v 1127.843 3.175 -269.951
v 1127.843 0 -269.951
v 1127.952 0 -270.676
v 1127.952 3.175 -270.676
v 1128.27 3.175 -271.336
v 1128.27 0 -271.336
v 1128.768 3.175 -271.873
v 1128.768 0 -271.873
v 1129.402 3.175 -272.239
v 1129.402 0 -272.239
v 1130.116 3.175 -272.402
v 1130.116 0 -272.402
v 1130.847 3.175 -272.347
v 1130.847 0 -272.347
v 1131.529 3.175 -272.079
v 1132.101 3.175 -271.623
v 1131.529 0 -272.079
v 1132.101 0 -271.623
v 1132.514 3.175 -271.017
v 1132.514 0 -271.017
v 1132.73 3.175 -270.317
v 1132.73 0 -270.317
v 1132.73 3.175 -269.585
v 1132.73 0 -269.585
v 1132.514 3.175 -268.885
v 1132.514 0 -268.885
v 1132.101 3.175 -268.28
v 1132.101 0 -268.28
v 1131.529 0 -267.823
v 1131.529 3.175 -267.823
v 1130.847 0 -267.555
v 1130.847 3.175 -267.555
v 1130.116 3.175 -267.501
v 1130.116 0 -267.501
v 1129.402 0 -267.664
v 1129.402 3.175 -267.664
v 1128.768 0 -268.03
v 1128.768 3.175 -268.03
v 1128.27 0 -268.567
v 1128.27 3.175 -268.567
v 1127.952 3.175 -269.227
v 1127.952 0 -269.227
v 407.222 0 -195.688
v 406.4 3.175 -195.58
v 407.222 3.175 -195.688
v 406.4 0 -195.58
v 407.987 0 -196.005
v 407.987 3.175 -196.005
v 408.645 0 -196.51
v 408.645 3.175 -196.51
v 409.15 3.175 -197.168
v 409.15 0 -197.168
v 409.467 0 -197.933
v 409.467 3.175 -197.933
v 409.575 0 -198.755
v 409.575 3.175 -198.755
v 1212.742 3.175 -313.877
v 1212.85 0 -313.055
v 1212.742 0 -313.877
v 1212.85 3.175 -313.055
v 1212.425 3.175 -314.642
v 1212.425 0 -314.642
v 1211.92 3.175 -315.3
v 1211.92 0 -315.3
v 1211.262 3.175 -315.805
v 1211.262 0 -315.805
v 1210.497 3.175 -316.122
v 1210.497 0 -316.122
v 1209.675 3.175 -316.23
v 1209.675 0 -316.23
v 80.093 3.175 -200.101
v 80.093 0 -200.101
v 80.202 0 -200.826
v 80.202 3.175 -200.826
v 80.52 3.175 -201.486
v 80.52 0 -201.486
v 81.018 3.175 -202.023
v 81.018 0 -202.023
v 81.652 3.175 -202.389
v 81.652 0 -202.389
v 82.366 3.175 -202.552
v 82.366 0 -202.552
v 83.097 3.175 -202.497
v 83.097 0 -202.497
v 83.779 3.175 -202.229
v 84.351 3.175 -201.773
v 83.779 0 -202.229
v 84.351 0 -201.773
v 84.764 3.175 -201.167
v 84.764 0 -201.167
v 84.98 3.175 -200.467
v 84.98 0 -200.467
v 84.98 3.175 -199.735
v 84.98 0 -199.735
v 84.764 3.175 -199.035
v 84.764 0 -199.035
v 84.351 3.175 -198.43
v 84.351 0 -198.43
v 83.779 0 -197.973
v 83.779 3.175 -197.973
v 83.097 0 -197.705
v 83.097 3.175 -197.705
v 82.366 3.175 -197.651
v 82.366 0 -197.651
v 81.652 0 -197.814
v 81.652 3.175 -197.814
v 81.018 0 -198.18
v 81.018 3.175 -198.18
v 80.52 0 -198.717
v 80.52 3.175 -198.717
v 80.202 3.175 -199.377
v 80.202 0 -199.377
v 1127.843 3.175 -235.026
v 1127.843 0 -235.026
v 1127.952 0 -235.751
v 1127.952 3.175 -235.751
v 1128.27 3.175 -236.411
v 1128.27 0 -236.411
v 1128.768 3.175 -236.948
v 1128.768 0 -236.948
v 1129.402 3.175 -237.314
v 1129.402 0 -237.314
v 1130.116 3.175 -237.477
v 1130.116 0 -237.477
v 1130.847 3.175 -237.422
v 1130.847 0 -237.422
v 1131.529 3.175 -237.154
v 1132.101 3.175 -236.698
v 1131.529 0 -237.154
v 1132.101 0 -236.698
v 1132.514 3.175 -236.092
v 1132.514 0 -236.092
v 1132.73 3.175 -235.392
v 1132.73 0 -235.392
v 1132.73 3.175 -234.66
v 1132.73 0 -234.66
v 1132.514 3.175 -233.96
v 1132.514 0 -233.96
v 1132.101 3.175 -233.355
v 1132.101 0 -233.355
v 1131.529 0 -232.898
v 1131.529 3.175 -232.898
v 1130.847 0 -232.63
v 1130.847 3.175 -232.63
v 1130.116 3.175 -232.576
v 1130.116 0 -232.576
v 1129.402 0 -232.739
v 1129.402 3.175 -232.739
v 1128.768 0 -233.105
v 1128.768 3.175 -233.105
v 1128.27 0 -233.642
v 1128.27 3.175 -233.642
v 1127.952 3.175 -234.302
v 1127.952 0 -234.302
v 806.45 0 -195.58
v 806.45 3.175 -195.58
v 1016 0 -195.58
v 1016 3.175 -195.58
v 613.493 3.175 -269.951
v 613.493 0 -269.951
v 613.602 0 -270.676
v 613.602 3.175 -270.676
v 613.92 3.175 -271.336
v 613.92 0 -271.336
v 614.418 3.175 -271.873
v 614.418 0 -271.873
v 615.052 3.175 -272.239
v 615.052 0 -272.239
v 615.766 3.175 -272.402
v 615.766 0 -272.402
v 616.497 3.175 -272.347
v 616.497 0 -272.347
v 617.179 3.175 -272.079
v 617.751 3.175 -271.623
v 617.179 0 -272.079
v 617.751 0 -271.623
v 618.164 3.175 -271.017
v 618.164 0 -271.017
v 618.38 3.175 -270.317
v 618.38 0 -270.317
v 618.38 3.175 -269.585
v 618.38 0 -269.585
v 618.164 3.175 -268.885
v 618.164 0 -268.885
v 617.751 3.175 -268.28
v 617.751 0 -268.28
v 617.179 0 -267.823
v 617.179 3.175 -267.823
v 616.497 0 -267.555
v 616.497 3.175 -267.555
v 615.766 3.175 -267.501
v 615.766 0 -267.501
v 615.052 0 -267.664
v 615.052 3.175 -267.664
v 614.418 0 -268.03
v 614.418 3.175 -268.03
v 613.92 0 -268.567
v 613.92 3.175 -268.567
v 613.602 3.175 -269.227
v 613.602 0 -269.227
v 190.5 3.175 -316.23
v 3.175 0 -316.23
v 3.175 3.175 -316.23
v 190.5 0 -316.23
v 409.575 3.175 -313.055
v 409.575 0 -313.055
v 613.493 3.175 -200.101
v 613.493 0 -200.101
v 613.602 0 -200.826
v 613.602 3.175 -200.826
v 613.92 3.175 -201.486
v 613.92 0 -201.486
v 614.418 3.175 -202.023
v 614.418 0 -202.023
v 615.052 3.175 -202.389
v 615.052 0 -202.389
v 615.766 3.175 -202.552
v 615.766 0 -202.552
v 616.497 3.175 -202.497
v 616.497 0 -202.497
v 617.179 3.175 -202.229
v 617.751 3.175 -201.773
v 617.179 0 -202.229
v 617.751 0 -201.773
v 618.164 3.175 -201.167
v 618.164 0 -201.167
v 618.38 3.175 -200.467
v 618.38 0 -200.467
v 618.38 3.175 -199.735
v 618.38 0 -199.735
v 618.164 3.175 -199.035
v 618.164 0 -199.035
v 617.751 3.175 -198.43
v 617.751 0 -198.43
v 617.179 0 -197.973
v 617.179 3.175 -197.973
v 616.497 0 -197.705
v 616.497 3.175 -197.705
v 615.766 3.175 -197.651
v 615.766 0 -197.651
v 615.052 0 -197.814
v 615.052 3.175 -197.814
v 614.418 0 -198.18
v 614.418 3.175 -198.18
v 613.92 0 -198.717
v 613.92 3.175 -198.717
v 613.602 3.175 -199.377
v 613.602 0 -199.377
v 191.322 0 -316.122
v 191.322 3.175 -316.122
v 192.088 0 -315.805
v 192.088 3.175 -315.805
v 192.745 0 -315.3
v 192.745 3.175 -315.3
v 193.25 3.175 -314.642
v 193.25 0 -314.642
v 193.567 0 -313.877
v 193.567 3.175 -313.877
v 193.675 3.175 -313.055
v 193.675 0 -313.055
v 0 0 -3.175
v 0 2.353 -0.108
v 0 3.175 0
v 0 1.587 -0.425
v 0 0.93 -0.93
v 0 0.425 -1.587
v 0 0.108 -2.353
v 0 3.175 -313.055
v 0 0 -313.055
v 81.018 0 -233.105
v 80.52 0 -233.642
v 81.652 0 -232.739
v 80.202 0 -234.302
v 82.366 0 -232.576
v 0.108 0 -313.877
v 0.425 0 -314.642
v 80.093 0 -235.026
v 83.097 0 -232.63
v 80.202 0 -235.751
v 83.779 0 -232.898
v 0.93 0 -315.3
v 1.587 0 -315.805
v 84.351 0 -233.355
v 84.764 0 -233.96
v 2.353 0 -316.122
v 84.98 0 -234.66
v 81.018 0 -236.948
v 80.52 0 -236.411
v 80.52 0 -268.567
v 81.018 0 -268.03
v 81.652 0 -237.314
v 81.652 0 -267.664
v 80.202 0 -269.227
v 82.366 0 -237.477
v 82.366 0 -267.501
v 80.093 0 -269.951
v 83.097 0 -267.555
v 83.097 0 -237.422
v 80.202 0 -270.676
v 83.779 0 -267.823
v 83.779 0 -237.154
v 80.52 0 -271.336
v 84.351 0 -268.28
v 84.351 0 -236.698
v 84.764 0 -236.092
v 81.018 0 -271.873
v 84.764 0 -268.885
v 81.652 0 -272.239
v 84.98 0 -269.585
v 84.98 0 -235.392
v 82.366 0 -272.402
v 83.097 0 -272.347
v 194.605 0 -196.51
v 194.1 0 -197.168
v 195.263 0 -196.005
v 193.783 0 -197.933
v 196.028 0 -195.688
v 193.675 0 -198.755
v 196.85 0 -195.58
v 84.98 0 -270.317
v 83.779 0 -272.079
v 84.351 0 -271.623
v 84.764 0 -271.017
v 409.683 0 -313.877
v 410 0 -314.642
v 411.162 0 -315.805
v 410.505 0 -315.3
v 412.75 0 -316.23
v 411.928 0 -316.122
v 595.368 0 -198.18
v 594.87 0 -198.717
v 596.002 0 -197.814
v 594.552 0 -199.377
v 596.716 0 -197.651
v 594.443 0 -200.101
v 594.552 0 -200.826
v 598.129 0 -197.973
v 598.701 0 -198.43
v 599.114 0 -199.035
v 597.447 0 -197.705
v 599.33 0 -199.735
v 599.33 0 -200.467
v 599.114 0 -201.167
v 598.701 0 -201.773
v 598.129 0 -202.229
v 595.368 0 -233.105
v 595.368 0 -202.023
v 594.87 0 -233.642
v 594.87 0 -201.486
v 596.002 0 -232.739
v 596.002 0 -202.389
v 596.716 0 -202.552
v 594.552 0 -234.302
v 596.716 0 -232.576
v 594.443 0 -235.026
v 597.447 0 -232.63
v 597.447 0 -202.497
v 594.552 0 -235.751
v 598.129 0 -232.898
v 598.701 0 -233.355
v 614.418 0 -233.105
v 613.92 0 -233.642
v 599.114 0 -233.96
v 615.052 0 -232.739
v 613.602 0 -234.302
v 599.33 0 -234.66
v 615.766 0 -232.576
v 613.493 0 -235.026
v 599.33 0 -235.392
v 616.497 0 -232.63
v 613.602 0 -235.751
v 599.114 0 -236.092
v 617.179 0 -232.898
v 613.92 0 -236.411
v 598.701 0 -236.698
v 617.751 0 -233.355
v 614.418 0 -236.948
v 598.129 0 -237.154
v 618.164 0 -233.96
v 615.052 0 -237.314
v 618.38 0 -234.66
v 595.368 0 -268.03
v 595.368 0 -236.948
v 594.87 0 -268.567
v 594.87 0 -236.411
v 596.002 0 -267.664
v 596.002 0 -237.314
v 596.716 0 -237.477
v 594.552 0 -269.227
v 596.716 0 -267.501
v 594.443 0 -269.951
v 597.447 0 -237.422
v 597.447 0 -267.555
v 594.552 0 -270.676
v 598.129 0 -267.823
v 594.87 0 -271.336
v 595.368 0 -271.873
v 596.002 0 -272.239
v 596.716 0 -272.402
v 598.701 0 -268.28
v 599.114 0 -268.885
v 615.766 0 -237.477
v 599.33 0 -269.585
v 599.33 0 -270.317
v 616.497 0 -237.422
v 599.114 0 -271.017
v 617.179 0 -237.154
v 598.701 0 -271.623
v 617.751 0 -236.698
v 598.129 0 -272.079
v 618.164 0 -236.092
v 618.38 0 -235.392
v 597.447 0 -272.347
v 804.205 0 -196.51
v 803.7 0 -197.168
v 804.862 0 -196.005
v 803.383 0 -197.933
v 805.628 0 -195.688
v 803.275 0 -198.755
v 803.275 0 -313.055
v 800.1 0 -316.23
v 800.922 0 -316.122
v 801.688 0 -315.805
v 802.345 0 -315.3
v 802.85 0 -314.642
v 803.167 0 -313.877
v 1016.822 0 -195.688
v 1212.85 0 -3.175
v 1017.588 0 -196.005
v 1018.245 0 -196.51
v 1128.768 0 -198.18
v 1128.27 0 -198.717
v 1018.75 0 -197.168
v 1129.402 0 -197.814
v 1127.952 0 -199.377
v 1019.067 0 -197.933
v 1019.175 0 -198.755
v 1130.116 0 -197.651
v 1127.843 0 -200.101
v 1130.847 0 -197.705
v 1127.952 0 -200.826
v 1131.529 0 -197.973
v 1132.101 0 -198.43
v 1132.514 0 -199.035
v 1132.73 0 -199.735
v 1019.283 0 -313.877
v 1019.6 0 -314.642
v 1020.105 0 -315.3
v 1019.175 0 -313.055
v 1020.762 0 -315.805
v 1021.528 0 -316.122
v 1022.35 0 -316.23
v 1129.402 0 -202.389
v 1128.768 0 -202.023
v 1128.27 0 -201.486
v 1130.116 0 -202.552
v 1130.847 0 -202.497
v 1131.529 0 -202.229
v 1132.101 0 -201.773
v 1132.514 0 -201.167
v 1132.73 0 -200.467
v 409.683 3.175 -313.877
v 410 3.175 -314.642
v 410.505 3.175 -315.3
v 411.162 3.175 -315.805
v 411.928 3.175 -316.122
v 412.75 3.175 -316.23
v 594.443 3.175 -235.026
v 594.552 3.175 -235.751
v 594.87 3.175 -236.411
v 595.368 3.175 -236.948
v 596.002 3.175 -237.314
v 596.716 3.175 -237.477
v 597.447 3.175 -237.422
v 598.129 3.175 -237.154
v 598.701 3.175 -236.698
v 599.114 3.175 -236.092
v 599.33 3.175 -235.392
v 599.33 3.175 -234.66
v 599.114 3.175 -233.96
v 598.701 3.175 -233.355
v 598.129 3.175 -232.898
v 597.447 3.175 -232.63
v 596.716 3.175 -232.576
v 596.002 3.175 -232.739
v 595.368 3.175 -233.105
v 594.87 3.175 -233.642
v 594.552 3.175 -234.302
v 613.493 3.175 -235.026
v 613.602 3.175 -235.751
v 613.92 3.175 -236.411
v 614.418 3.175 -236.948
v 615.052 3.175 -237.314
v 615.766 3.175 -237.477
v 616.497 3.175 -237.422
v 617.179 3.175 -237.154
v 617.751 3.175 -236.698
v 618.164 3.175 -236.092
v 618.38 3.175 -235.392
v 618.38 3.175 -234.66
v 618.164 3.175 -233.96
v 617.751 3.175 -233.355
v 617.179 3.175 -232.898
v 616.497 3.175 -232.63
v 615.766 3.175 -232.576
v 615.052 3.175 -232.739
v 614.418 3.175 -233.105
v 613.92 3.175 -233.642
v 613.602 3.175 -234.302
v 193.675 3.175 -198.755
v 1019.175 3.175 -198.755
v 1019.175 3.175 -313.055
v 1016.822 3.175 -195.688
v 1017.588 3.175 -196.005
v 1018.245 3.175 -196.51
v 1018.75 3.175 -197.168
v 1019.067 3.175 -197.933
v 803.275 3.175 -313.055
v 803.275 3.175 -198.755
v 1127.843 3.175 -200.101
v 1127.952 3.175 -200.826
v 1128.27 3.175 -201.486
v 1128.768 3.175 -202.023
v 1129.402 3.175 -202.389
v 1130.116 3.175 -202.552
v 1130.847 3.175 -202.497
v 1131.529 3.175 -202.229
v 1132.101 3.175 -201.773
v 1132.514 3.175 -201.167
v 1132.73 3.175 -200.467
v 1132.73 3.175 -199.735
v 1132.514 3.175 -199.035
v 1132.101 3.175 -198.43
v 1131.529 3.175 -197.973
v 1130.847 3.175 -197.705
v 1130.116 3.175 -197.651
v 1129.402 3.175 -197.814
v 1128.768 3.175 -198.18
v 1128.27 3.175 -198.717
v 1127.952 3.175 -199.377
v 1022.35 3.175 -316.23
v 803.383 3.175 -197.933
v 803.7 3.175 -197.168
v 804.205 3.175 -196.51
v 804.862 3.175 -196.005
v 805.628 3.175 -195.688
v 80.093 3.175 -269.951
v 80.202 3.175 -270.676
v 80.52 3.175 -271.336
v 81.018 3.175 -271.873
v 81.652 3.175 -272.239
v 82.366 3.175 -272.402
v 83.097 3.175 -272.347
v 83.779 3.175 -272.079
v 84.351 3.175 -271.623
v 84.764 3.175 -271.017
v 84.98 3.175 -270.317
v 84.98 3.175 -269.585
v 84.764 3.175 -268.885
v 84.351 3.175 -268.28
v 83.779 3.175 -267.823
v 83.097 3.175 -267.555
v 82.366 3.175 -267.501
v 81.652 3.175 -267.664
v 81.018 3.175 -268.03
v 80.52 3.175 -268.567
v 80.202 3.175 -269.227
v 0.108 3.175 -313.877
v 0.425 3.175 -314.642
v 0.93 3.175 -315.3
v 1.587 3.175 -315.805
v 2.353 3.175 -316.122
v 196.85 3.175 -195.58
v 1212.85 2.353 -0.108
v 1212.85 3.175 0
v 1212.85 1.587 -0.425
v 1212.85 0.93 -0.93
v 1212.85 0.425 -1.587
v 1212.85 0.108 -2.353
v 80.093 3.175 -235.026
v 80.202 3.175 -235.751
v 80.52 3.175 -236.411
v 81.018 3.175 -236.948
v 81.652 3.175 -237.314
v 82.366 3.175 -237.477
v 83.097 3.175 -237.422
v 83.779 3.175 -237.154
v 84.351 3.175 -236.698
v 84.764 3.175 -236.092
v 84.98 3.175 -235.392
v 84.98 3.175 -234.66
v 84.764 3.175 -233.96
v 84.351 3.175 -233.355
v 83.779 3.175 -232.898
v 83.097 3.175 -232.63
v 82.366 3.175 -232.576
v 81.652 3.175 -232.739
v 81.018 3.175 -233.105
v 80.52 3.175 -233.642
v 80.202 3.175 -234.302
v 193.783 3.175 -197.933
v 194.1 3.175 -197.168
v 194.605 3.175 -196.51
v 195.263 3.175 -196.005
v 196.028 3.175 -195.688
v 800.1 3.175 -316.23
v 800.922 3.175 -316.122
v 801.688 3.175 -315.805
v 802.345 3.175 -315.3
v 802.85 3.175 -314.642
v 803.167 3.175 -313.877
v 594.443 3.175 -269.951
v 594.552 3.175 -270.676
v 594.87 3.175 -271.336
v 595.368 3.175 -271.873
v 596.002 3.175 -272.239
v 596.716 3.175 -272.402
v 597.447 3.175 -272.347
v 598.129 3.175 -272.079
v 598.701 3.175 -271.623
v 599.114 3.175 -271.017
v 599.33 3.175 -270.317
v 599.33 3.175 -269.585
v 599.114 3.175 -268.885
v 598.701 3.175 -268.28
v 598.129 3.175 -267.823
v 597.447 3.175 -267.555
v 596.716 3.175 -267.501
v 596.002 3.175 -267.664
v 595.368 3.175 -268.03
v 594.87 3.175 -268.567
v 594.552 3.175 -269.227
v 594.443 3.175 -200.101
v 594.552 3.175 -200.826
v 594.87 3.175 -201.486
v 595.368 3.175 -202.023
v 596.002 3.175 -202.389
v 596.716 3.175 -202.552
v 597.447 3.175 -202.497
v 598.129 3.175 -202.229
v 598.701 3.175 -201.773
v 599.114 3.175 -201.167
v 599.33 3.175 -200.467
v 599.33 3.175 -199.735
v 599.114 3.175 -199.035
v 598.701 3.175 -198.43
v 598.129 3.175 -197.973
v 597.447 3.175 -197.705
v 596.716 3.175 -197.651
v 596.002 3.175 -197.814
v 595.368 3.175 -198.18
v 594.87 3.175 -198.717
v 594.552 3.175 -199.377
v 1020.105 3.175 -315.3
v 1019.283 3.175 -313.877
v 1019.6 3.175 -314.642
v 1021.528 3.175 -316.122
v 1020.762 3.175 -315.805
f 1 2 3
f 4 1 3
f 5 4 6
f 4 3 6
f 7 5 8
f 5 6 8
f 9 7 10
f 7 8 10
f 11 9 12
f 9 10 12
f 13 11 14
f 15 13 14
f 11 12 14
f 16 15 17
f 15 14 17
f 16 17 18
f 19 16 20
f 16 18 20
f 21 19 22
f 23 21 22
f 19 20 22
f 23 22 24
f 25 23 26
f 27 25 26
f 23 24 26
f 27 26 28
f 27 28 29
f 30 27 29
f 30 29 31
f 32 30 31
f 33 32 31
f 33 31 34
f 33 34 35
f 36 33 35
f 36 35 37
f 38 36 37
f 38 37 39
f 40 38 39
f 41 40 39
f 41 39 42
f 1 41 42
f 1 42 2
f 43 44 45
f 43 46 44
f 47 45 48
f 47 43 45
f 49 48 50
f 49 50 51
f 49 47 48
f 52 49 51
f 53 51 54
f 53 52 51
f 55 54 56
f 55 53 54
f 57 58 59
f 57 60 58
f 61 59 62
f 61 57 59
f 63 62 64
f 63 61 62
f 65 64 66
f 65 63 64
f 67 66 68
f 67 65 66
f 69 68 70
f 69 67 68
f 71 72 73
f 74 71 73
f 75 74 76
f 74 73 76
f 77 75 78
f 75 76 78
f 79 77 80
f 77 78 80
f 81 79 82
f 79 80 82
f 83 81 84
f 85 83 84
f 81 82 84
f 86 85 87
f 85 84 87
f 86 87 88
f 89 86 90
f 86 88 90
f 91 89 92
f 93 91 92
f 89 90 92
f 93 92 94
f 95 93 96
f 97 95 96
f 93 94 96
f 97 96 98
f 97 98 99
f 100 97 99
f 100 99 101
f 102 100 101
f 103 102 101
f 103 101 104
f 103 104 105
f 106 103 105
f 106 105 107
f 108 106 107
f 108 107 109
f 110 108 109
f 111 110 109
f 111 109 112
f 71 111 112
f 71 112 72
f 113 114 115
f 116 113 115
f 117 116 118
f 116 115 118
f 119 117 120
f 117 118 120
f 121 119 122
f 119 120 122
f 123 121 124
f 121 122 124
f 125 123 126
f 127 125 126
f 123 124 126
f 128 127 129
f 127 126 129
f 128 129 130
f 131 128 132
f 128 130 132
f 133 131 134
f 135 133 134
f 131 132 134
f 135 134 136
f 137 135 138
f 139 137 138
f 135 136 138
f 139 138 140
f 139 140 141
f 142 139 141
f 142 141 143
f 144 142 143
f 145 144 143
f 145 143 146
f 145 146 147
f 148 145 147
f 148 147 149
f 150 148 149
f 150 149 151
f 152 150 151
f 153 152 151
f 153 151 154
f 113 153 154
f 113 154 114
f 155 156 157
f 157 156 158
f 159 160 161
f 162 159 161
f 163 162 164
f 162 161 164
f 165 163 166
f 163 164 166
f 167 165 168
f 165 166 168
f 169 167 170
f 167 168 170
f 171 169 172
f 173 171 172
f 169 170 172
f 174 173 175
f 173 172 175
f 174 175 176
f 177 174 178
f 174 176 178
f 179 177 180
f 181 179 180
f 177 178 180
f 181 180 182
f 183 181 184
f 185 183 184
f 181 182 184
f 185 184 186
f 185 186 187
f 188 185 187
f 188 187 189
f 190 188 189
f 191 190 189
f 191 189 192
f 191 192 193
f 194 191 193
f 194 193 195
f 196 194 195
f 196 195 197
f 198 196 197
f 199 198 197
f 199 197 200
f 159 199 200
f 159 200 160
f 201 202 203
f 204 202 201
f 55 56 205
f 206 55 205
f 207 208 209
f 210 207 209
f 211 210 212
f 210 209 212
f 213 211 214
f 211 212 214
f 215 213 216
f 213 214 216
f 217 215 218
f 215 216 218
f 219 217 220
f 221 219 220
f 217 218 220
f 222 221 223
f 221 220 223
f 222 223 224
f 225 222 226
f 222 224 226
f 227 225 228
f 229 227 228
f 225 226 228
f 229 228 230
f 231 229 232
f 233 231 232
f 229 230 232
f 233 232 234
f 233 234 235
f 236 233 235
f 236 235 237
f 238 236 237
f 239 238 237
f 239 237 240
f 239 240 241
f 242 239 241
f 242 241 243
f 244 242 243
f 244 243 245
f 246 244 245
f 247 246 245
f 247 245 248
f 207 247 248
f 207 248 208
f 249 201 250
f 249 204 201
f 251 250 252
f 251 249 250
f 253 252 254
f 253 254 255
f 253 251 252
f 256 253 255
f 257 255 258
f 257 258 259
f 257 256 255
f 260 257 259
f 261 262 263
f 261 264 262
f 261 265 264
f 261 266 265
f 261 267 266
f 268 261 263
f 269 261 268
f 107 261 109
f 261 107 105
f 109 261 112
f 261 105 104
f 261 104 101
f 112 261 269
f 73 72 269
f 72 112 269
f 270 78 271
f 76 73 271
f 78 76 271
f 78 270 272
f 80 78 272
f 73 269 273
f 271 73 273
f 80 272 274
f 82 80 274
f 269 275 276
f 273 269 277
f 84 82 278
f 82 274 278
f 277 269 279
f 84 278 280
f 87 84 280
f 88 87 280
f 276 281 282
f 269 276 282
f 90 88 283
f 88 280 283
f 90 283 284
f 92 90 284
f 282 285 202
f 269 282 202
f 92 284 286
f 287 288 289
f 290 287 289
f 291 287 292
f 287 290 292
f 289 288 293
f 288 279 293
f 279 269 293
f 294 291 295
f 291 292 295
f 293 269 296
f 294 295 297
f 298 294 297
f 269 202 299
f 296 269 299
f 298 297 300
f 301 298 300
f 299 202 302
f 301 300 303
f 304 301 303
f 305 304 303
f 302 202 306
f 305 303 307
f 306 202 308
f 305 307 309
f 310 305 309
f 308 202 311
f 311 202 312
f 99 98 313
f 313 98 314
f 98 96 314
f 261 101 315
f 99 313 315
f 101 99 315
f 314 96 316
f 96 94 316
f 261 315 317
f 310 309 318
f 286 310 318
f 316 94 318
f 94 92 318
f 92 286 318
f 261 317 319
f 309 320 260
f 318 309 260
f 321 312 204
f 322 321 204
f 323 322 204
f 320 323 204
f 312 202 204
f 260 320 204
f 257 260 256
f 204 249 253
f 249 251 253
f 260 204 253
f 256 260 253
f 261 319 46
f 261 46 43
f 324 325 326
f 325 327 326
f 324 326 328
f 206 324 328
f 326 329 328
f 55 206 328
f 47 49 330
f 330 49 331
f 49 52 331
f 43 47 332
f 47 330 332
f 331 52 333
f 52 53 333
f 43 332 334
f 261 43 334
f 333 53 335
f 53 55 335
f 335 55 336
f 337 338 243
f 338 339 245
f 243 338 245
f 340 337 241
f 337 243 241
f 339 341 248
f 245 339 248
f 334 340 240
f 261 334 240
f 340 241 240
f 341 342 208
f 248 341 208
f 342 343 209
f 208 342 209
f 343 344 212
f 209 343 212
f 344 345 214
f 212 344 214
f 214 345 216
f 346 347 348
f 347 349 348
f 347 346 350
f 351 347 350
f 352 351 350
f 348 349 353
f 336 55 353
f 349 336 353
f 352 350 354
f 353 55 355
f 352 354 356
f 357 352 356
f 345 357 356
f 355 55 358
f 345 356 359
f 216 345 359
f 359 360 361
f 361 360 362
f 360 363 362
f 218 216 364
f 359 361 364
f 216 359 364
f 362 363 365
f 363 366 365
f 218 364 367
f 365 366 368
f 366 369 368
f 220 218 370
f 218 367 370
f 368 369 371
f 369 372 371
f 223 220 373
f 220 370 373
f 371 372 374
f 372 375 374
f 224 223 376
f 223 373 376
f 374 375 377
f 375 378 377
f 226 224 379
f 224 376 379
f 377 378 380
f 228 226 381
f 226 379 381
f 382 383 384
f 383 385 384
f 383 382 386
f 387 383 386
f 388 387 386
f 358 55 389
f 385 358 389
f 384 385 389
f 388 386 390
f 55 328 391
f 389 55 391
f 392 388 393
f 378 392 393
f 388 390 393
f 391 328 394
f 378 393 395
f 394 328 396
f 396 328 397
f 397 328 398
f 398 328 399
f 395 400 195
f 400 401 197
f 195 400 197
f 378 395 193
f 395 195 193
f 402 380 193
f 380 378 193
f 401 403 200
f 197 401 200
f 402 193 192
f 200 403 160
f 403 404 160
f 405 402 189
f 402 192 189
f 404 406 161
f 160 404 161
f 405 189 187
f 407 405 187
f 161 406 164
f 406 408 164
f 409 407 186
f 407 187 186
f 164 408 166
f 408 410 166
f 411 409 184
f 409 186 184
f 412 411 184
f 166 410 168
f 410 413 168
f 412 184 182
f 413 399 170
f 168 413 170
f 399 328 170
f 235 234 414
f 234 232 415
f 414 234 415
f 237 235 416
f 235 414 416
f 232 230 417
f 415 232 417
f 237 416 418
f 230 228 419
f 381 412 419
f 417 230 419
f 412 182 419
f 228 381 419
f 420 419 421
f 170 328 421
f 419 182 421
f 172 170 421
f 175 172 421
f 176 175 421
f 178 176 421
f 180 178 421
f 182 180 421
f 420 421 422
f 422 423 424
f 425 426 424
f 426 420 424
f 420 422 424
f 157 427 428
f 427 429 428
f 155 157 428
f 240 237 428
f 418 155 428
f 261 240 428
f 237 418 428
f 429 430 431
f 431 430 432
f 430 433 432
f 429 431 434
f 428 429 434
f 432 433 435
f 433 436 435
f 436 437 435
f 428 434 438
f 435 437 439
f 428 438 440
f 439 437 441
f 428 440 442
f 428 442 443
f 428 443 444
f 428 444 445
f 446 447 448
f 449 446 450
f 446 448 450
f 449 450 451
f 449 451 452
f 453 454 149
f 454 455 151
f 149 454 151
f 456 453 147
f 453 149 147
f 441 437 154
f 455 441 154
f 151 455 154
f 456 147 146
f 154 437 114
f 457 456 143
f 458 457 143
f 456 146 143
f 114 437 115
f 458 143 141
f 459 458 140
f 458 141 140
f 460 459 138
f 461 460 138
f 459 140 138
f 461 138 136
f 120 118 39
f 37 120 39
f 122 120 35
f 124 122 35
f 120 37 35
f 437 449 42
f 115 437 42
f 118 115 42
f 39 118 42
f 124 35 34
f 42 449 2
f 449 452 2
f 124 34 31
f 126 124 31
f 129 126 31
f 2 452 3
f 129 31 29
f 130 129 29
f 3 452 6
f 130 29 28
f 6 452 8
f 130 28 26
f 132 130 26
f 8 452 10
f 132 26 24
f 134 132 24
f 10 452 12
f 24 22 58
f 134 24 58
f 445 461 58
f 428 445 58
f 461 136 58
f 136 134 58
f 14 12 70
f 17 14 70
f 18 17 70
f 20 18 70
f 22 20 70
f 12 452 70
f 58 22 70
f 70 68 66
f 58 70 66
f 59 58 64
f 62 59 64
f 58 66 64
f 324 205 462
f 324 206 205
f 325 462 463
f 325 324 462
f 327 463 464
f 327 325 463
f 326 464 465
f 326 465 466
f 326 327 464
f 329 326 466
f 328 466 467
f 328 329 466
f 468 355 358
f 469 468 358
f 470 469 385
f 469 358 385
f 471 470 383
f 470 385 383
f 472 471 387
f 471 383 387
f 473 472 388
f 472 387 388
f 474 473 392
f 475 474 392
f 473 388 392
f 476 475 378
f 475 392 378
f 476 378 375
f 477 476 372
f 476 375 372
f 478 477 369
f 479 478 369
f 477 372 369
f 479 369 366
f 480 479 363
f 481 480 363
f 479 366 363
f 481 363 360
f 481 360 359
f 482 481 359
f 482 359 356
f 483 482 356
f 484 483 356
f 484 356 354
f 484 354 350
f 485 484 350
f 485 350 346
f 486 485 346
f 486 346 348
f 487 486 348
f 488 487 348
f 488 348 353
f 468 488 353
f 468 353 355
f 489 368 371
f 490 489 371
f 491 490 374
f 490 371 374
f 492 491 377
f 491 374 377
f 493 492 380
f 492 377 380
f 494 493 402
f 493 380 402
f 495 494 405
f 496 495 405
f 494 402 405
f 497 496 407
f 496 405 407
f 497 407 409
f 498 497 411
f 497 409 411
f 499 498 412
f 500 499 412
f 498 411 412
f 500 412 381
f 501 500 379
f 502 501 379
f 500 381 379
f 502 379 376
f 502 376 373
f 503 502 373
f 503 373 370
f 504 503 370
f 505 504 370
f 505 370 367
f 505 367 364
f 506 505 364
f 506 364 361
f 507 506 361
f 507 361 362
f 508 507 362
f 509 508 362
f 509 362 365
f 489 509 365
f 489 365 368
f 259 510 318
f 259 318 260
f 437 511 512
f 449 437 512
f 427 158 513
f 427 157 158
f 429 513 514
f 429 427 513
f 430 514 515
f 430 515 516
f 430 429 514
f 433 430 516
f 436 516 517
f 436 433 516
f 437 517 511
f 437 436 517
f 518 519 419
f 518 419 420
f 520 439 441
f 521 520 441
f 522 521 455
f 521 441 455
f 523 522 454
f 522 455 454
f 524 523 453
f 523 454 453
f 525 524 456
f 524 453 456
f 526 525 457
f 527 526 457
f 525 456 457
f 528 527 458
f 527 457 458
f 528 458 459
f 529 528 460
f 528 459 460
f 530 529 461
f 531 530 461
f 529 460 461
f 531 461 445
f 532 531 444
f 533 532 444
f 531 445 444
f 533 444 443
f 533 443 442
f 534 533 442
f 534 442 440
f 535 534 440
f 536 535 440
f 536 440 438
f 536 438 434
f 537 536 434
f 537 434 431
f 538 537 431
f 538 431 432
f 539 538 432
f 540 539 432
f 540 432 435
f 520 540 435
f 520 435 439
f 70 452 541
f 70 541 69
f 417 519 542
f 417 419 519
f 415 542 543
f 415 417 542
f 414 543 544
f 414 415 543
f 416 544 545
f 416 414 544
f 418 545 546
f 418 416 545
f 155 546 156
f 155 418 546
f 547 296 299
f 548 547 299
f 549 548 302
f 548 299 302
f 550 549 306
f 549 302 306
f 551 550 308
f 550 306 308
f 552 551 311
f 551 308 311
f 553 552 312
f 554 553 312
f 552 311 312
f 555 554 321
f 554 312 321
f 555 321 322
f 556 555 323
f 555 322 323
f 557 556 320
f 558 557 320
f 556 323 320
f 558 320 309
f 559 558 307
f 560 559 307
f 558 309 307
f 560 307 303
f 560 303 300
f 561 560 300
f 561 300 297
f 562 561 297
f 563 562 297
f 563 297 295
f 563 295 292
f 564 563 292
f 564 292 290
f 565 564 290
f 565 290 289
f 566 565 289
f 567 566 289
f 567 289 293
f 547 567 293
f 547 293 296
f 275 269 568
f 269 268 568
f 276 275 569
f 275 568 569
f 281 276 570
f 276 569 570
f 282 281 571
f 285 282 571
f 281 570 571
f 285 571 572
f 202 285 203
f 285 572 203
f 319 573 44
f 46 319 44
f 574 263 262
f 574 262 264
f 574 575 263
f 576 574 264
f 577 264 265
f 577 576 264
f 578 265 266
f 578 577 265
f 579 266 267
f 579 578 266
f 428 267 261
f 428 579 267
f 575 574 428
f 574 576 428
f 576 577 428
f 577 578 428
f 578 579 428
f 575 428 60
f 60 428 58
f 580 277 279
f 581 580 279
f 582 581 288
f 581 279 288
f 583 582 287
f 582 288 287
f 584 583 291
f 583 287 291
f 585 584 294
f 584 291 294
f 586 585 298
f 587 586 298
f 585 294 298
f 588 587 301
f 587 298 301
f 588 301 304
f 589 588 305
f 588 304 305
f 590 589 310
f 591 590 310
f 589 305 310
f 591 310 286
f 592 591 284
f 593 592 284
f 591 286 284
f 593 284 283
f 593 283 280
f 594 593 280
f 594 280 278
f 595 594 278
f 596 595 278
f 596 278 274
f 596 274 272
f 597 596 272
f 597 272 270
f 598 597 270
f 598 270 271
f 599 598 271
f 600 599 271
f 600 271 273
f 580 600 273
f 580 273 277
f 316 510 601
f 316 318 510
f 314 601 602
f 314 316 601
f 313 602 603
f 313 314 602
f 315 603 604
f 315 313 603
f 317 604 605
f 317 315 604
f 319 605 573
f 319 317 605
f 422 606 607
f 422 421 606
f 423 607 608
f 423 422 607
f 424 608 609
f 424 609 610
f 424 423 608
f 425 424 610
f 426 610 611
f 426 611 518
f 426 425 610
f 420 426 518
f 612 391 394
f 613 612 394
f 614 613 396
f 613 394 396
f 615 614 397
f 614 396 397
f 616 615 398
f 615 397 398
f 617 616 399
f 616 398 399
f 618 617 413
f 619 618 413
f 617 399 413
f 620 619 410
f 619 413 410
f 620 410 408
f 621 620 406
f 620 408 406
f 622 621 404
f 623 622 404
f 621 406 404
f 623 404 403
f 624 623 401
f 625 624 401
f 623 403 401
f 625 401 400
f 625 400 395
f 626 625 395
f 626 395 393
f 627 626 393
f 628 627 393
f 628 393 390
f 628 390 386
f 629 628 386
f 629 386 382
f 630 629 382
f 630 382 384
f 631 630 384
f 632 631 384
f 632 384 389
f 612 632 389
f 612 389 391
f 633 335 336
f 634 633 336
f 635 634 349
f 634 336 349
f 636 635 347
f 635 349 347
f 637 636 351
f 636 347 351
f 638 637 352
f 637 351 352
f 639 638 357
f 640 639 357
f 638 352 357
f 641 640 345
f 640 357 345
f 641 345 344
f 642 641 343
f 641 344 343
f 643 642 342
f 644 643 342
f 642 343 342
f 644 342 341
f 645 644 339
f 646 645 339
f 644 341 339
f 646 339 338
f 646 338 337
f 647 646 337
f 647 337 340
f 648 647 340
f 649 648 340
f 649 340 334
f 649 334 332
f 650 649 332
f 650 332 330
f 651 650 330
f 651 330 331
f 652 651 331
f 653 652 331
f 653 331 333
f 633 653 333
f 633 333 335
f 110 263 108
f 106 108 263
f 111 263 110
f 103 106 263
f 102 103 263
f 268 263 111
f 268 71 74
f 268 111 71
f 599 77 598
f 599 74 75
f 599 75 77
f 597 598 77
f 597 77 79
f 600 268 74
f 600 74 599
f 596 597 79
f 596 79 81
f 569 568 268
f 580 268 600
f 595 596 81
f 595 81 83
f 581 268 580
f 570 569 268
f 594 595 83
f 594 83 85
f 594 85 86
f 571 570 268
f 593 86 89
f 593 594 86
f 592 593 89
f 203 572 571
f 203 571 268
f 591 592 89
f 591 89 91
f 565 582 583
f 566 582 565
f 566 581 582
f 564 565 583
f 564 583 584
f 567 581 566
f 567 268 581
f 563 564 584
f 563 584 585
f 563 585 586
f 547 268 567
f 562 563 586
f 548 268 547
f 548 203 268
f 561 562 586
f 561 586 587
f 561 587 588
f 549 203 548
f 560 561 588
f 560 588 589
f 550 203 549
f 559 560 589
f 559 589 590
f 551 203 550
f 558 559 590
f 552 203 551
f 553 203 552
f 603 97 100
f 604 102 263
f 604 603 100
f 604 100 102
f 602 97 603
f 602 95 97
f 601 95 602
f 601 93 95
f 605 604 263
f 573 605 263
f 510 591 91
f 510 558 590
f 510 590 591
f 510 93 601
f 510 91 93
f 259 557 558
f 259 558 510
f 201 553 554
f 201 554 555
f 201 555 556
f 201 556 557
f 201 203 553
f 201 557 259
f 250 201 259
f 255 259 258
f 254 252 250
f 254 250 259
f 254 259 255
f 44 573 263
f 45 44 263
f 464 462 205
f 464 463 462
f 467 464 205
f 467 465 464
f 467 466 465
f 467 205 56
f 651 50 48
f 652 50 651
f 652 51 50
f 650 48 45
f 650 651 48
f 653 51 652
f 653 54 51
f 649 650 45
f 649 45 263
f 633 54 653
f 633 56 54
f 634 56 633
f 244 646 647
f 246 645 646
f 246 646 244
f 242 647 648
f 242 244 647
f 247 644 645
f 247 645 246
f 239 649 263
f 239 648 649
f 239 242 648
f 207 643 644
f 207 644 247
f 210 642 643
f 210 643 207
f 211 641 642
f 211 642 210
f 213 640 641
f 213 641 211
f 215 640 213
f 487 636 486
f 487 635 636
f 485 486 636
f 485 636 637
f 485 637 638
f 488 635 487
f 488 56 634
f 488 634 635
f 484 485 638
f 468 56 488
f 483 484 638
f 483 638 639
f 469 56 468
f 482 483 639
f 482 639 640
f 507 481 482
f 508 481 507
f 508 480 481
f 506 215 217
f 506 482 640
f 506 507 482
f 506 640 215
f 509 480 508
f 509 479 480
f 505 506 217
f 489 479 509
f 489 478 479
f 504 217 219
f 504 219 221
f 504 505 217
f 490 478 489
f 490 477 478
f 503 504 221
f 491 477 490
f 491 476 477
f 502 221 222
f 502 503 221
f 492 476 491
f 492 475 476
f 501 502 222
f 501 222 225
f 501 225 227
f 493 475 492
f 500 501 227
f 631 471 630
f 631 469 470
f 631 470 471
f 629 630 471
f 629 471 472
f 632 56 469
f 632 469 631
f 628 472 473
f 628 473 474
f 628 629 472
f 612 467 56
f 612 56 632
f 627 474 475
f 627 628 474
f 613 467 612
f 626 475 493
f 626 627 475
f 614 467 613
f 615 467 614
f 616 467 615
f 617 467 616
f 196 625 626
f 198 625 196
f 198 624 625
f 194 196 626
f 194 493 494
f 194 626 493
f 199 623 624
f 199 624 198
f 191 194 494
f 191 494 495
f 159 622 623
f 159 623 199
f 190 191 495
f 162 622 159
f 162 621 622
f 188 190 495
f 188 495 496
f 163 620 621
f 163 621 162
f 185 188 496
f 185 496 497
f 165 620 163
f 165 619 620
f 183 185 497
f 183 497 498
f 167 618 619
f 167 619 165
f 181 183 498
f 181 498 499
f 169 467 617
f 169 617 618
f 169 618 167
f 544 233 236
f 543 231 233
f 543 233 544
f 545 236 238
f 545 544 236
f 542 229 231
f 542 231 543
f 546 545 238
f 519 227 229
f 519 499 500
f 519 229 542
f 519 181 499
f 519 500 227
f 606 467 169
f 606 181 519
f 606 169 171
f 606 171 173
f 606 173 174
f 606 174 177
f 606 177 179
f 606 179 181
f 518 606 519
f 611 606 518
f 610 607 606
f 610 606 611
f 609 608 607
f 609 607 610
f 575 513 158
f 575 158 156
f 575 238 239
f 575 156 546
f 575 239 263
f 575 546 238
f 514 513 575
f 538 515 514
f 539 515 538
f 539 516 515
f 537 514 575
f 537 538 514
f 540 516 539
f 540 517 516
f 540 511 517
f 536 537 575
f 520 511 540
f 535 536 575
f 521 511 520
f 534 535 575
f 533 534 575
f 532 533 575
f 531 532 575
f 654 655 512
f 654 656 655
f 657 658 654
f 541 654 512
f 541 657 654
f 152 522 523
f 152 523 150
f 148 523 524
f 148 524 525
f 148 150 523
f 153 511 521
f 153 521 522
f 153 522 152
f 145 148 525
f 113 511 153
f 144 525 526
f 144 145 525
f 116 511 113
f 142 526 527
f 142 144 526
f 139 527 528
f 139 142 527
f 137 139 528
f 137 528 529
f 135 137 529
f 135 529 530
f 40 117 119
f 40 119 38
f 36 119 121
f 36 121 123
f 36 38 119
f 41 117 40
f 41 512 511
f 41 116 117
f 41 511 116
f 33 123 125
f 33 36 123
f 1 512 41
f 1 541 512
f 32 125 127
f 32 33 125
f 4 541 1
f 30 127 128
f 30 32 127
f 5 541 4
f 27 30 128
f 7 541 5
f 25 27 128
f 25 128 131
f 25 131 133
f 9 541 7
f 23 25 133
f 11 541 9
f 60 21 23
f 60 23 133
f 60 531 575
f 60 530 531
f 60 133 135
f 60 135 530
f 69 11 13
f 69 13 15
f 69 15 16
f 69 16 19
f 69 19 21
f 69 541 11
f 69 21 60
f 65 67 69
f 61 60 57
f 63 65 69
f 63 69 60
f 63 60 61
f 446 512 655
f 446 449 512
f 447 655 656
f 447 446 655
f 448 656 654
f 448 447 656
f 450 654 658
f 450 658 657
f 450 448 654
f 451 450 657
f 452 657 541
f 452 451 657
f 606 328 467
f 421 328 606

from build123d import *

# Parameters (mm, degrees)
SKETCH1_W                    = 1212.85
SKETCH1_H                    = 316.23
BOSS_EXTRUDE1_DEPTH          = 3.175
FILLET1_R                    = 3.175
SKETCH4_W                    = 215.9
SKETCH4_H                    = 120.65
CUT_EXTRUDE1_DEPTH           = 1254.402016922
FILLET2_R                    = 3.175
F_10_0_1935_DIAMETER_HOLE1_D = 4.9149


with BuildPart() as part:
    # Sketch1 → Boss-Extrude1 (new body)
    with BuildSketch(Plane(origin=(0, 0, 0), x_dir=(1, 0, 0), z_dir=(0, 1, 0))):
        with Locations((606.425, 158.115)):
            Rectangle(SKETCH1_W, SKETCH1_H)
    extrude(amount=BOSS_EXTRUDE1_DEPTH)

    # Fillet1
    fillet1_edges = [part.edges().sort_by_distance(p)[0] for p in [
        (606.425, 0, 0),
    ]]
    fillet(fillet1_edges, radius=FILLET1_R - 0.0001)  # a hair under: the kernel refuses the full size

    # Sketch4 → Cut-Extrude1 (cut, through all)
    with BuildSketch(Plane(origin=(0, 3.175, 0), x_dir=(1, 0, 0), z_dir=(0, 1, 0))):
        with Locations((301.625, 255.905)):
            Rectangle(SKETCH4_W, SKETCH4_H)
        with Locations((911.225, 255.905)):
            Rectangle(SKETCH4_W, SKETCH4_H)
    extrude(amount=-CUT_EXTRUDE1_DEPTH, mode=Mode.SUBTRACT)

    # Fillet2
    fillet2_edges = [part.edges().sort_by_distance(p)[0] for p in [
        (193.675, 1.5875, -195.58),
        (193.675, 1.5875, -316.23),
        (409.575, 1.5875, -316.23),
        (409.575, 1.5875, -195.58),
        (803.275, 1.5875, -316.23),
        (1019.175, 1.5875, -316.23),
        (1019.175, 1.5875, -195.58),
        (803.275, 1.5875, -195.58),
        (0, 1.5875, -316.23),
        (1212.85, 1.5875, -316.23),
    ]]
    fillet(fillet2_edges, radius=FILLET2_R)

    # #10 (0.1935) Diameter Hole1 (through all)
    with Locations(Plane(origin=(0, 3.175, 0), x_dir=(1, 0, 0), z_dir=(0, 1, 0))):
        with Locations((82.55, 200.1012), (82.55, 235.0262), (82.55, 269.9512), (596.9, 200.1012), (596.9, 235.0262), (596.9, 269.9512), (615.95, 269.9512), (615.95, 235.0262), (615.95, 200.1012), (1130.3, 269.9512), (1130.3, 235.0262), (1130.3, 200.1012)):
            Hole(F_10_0_1935_DIAMETER_HOLE1_D / 2)


solid = part.part
